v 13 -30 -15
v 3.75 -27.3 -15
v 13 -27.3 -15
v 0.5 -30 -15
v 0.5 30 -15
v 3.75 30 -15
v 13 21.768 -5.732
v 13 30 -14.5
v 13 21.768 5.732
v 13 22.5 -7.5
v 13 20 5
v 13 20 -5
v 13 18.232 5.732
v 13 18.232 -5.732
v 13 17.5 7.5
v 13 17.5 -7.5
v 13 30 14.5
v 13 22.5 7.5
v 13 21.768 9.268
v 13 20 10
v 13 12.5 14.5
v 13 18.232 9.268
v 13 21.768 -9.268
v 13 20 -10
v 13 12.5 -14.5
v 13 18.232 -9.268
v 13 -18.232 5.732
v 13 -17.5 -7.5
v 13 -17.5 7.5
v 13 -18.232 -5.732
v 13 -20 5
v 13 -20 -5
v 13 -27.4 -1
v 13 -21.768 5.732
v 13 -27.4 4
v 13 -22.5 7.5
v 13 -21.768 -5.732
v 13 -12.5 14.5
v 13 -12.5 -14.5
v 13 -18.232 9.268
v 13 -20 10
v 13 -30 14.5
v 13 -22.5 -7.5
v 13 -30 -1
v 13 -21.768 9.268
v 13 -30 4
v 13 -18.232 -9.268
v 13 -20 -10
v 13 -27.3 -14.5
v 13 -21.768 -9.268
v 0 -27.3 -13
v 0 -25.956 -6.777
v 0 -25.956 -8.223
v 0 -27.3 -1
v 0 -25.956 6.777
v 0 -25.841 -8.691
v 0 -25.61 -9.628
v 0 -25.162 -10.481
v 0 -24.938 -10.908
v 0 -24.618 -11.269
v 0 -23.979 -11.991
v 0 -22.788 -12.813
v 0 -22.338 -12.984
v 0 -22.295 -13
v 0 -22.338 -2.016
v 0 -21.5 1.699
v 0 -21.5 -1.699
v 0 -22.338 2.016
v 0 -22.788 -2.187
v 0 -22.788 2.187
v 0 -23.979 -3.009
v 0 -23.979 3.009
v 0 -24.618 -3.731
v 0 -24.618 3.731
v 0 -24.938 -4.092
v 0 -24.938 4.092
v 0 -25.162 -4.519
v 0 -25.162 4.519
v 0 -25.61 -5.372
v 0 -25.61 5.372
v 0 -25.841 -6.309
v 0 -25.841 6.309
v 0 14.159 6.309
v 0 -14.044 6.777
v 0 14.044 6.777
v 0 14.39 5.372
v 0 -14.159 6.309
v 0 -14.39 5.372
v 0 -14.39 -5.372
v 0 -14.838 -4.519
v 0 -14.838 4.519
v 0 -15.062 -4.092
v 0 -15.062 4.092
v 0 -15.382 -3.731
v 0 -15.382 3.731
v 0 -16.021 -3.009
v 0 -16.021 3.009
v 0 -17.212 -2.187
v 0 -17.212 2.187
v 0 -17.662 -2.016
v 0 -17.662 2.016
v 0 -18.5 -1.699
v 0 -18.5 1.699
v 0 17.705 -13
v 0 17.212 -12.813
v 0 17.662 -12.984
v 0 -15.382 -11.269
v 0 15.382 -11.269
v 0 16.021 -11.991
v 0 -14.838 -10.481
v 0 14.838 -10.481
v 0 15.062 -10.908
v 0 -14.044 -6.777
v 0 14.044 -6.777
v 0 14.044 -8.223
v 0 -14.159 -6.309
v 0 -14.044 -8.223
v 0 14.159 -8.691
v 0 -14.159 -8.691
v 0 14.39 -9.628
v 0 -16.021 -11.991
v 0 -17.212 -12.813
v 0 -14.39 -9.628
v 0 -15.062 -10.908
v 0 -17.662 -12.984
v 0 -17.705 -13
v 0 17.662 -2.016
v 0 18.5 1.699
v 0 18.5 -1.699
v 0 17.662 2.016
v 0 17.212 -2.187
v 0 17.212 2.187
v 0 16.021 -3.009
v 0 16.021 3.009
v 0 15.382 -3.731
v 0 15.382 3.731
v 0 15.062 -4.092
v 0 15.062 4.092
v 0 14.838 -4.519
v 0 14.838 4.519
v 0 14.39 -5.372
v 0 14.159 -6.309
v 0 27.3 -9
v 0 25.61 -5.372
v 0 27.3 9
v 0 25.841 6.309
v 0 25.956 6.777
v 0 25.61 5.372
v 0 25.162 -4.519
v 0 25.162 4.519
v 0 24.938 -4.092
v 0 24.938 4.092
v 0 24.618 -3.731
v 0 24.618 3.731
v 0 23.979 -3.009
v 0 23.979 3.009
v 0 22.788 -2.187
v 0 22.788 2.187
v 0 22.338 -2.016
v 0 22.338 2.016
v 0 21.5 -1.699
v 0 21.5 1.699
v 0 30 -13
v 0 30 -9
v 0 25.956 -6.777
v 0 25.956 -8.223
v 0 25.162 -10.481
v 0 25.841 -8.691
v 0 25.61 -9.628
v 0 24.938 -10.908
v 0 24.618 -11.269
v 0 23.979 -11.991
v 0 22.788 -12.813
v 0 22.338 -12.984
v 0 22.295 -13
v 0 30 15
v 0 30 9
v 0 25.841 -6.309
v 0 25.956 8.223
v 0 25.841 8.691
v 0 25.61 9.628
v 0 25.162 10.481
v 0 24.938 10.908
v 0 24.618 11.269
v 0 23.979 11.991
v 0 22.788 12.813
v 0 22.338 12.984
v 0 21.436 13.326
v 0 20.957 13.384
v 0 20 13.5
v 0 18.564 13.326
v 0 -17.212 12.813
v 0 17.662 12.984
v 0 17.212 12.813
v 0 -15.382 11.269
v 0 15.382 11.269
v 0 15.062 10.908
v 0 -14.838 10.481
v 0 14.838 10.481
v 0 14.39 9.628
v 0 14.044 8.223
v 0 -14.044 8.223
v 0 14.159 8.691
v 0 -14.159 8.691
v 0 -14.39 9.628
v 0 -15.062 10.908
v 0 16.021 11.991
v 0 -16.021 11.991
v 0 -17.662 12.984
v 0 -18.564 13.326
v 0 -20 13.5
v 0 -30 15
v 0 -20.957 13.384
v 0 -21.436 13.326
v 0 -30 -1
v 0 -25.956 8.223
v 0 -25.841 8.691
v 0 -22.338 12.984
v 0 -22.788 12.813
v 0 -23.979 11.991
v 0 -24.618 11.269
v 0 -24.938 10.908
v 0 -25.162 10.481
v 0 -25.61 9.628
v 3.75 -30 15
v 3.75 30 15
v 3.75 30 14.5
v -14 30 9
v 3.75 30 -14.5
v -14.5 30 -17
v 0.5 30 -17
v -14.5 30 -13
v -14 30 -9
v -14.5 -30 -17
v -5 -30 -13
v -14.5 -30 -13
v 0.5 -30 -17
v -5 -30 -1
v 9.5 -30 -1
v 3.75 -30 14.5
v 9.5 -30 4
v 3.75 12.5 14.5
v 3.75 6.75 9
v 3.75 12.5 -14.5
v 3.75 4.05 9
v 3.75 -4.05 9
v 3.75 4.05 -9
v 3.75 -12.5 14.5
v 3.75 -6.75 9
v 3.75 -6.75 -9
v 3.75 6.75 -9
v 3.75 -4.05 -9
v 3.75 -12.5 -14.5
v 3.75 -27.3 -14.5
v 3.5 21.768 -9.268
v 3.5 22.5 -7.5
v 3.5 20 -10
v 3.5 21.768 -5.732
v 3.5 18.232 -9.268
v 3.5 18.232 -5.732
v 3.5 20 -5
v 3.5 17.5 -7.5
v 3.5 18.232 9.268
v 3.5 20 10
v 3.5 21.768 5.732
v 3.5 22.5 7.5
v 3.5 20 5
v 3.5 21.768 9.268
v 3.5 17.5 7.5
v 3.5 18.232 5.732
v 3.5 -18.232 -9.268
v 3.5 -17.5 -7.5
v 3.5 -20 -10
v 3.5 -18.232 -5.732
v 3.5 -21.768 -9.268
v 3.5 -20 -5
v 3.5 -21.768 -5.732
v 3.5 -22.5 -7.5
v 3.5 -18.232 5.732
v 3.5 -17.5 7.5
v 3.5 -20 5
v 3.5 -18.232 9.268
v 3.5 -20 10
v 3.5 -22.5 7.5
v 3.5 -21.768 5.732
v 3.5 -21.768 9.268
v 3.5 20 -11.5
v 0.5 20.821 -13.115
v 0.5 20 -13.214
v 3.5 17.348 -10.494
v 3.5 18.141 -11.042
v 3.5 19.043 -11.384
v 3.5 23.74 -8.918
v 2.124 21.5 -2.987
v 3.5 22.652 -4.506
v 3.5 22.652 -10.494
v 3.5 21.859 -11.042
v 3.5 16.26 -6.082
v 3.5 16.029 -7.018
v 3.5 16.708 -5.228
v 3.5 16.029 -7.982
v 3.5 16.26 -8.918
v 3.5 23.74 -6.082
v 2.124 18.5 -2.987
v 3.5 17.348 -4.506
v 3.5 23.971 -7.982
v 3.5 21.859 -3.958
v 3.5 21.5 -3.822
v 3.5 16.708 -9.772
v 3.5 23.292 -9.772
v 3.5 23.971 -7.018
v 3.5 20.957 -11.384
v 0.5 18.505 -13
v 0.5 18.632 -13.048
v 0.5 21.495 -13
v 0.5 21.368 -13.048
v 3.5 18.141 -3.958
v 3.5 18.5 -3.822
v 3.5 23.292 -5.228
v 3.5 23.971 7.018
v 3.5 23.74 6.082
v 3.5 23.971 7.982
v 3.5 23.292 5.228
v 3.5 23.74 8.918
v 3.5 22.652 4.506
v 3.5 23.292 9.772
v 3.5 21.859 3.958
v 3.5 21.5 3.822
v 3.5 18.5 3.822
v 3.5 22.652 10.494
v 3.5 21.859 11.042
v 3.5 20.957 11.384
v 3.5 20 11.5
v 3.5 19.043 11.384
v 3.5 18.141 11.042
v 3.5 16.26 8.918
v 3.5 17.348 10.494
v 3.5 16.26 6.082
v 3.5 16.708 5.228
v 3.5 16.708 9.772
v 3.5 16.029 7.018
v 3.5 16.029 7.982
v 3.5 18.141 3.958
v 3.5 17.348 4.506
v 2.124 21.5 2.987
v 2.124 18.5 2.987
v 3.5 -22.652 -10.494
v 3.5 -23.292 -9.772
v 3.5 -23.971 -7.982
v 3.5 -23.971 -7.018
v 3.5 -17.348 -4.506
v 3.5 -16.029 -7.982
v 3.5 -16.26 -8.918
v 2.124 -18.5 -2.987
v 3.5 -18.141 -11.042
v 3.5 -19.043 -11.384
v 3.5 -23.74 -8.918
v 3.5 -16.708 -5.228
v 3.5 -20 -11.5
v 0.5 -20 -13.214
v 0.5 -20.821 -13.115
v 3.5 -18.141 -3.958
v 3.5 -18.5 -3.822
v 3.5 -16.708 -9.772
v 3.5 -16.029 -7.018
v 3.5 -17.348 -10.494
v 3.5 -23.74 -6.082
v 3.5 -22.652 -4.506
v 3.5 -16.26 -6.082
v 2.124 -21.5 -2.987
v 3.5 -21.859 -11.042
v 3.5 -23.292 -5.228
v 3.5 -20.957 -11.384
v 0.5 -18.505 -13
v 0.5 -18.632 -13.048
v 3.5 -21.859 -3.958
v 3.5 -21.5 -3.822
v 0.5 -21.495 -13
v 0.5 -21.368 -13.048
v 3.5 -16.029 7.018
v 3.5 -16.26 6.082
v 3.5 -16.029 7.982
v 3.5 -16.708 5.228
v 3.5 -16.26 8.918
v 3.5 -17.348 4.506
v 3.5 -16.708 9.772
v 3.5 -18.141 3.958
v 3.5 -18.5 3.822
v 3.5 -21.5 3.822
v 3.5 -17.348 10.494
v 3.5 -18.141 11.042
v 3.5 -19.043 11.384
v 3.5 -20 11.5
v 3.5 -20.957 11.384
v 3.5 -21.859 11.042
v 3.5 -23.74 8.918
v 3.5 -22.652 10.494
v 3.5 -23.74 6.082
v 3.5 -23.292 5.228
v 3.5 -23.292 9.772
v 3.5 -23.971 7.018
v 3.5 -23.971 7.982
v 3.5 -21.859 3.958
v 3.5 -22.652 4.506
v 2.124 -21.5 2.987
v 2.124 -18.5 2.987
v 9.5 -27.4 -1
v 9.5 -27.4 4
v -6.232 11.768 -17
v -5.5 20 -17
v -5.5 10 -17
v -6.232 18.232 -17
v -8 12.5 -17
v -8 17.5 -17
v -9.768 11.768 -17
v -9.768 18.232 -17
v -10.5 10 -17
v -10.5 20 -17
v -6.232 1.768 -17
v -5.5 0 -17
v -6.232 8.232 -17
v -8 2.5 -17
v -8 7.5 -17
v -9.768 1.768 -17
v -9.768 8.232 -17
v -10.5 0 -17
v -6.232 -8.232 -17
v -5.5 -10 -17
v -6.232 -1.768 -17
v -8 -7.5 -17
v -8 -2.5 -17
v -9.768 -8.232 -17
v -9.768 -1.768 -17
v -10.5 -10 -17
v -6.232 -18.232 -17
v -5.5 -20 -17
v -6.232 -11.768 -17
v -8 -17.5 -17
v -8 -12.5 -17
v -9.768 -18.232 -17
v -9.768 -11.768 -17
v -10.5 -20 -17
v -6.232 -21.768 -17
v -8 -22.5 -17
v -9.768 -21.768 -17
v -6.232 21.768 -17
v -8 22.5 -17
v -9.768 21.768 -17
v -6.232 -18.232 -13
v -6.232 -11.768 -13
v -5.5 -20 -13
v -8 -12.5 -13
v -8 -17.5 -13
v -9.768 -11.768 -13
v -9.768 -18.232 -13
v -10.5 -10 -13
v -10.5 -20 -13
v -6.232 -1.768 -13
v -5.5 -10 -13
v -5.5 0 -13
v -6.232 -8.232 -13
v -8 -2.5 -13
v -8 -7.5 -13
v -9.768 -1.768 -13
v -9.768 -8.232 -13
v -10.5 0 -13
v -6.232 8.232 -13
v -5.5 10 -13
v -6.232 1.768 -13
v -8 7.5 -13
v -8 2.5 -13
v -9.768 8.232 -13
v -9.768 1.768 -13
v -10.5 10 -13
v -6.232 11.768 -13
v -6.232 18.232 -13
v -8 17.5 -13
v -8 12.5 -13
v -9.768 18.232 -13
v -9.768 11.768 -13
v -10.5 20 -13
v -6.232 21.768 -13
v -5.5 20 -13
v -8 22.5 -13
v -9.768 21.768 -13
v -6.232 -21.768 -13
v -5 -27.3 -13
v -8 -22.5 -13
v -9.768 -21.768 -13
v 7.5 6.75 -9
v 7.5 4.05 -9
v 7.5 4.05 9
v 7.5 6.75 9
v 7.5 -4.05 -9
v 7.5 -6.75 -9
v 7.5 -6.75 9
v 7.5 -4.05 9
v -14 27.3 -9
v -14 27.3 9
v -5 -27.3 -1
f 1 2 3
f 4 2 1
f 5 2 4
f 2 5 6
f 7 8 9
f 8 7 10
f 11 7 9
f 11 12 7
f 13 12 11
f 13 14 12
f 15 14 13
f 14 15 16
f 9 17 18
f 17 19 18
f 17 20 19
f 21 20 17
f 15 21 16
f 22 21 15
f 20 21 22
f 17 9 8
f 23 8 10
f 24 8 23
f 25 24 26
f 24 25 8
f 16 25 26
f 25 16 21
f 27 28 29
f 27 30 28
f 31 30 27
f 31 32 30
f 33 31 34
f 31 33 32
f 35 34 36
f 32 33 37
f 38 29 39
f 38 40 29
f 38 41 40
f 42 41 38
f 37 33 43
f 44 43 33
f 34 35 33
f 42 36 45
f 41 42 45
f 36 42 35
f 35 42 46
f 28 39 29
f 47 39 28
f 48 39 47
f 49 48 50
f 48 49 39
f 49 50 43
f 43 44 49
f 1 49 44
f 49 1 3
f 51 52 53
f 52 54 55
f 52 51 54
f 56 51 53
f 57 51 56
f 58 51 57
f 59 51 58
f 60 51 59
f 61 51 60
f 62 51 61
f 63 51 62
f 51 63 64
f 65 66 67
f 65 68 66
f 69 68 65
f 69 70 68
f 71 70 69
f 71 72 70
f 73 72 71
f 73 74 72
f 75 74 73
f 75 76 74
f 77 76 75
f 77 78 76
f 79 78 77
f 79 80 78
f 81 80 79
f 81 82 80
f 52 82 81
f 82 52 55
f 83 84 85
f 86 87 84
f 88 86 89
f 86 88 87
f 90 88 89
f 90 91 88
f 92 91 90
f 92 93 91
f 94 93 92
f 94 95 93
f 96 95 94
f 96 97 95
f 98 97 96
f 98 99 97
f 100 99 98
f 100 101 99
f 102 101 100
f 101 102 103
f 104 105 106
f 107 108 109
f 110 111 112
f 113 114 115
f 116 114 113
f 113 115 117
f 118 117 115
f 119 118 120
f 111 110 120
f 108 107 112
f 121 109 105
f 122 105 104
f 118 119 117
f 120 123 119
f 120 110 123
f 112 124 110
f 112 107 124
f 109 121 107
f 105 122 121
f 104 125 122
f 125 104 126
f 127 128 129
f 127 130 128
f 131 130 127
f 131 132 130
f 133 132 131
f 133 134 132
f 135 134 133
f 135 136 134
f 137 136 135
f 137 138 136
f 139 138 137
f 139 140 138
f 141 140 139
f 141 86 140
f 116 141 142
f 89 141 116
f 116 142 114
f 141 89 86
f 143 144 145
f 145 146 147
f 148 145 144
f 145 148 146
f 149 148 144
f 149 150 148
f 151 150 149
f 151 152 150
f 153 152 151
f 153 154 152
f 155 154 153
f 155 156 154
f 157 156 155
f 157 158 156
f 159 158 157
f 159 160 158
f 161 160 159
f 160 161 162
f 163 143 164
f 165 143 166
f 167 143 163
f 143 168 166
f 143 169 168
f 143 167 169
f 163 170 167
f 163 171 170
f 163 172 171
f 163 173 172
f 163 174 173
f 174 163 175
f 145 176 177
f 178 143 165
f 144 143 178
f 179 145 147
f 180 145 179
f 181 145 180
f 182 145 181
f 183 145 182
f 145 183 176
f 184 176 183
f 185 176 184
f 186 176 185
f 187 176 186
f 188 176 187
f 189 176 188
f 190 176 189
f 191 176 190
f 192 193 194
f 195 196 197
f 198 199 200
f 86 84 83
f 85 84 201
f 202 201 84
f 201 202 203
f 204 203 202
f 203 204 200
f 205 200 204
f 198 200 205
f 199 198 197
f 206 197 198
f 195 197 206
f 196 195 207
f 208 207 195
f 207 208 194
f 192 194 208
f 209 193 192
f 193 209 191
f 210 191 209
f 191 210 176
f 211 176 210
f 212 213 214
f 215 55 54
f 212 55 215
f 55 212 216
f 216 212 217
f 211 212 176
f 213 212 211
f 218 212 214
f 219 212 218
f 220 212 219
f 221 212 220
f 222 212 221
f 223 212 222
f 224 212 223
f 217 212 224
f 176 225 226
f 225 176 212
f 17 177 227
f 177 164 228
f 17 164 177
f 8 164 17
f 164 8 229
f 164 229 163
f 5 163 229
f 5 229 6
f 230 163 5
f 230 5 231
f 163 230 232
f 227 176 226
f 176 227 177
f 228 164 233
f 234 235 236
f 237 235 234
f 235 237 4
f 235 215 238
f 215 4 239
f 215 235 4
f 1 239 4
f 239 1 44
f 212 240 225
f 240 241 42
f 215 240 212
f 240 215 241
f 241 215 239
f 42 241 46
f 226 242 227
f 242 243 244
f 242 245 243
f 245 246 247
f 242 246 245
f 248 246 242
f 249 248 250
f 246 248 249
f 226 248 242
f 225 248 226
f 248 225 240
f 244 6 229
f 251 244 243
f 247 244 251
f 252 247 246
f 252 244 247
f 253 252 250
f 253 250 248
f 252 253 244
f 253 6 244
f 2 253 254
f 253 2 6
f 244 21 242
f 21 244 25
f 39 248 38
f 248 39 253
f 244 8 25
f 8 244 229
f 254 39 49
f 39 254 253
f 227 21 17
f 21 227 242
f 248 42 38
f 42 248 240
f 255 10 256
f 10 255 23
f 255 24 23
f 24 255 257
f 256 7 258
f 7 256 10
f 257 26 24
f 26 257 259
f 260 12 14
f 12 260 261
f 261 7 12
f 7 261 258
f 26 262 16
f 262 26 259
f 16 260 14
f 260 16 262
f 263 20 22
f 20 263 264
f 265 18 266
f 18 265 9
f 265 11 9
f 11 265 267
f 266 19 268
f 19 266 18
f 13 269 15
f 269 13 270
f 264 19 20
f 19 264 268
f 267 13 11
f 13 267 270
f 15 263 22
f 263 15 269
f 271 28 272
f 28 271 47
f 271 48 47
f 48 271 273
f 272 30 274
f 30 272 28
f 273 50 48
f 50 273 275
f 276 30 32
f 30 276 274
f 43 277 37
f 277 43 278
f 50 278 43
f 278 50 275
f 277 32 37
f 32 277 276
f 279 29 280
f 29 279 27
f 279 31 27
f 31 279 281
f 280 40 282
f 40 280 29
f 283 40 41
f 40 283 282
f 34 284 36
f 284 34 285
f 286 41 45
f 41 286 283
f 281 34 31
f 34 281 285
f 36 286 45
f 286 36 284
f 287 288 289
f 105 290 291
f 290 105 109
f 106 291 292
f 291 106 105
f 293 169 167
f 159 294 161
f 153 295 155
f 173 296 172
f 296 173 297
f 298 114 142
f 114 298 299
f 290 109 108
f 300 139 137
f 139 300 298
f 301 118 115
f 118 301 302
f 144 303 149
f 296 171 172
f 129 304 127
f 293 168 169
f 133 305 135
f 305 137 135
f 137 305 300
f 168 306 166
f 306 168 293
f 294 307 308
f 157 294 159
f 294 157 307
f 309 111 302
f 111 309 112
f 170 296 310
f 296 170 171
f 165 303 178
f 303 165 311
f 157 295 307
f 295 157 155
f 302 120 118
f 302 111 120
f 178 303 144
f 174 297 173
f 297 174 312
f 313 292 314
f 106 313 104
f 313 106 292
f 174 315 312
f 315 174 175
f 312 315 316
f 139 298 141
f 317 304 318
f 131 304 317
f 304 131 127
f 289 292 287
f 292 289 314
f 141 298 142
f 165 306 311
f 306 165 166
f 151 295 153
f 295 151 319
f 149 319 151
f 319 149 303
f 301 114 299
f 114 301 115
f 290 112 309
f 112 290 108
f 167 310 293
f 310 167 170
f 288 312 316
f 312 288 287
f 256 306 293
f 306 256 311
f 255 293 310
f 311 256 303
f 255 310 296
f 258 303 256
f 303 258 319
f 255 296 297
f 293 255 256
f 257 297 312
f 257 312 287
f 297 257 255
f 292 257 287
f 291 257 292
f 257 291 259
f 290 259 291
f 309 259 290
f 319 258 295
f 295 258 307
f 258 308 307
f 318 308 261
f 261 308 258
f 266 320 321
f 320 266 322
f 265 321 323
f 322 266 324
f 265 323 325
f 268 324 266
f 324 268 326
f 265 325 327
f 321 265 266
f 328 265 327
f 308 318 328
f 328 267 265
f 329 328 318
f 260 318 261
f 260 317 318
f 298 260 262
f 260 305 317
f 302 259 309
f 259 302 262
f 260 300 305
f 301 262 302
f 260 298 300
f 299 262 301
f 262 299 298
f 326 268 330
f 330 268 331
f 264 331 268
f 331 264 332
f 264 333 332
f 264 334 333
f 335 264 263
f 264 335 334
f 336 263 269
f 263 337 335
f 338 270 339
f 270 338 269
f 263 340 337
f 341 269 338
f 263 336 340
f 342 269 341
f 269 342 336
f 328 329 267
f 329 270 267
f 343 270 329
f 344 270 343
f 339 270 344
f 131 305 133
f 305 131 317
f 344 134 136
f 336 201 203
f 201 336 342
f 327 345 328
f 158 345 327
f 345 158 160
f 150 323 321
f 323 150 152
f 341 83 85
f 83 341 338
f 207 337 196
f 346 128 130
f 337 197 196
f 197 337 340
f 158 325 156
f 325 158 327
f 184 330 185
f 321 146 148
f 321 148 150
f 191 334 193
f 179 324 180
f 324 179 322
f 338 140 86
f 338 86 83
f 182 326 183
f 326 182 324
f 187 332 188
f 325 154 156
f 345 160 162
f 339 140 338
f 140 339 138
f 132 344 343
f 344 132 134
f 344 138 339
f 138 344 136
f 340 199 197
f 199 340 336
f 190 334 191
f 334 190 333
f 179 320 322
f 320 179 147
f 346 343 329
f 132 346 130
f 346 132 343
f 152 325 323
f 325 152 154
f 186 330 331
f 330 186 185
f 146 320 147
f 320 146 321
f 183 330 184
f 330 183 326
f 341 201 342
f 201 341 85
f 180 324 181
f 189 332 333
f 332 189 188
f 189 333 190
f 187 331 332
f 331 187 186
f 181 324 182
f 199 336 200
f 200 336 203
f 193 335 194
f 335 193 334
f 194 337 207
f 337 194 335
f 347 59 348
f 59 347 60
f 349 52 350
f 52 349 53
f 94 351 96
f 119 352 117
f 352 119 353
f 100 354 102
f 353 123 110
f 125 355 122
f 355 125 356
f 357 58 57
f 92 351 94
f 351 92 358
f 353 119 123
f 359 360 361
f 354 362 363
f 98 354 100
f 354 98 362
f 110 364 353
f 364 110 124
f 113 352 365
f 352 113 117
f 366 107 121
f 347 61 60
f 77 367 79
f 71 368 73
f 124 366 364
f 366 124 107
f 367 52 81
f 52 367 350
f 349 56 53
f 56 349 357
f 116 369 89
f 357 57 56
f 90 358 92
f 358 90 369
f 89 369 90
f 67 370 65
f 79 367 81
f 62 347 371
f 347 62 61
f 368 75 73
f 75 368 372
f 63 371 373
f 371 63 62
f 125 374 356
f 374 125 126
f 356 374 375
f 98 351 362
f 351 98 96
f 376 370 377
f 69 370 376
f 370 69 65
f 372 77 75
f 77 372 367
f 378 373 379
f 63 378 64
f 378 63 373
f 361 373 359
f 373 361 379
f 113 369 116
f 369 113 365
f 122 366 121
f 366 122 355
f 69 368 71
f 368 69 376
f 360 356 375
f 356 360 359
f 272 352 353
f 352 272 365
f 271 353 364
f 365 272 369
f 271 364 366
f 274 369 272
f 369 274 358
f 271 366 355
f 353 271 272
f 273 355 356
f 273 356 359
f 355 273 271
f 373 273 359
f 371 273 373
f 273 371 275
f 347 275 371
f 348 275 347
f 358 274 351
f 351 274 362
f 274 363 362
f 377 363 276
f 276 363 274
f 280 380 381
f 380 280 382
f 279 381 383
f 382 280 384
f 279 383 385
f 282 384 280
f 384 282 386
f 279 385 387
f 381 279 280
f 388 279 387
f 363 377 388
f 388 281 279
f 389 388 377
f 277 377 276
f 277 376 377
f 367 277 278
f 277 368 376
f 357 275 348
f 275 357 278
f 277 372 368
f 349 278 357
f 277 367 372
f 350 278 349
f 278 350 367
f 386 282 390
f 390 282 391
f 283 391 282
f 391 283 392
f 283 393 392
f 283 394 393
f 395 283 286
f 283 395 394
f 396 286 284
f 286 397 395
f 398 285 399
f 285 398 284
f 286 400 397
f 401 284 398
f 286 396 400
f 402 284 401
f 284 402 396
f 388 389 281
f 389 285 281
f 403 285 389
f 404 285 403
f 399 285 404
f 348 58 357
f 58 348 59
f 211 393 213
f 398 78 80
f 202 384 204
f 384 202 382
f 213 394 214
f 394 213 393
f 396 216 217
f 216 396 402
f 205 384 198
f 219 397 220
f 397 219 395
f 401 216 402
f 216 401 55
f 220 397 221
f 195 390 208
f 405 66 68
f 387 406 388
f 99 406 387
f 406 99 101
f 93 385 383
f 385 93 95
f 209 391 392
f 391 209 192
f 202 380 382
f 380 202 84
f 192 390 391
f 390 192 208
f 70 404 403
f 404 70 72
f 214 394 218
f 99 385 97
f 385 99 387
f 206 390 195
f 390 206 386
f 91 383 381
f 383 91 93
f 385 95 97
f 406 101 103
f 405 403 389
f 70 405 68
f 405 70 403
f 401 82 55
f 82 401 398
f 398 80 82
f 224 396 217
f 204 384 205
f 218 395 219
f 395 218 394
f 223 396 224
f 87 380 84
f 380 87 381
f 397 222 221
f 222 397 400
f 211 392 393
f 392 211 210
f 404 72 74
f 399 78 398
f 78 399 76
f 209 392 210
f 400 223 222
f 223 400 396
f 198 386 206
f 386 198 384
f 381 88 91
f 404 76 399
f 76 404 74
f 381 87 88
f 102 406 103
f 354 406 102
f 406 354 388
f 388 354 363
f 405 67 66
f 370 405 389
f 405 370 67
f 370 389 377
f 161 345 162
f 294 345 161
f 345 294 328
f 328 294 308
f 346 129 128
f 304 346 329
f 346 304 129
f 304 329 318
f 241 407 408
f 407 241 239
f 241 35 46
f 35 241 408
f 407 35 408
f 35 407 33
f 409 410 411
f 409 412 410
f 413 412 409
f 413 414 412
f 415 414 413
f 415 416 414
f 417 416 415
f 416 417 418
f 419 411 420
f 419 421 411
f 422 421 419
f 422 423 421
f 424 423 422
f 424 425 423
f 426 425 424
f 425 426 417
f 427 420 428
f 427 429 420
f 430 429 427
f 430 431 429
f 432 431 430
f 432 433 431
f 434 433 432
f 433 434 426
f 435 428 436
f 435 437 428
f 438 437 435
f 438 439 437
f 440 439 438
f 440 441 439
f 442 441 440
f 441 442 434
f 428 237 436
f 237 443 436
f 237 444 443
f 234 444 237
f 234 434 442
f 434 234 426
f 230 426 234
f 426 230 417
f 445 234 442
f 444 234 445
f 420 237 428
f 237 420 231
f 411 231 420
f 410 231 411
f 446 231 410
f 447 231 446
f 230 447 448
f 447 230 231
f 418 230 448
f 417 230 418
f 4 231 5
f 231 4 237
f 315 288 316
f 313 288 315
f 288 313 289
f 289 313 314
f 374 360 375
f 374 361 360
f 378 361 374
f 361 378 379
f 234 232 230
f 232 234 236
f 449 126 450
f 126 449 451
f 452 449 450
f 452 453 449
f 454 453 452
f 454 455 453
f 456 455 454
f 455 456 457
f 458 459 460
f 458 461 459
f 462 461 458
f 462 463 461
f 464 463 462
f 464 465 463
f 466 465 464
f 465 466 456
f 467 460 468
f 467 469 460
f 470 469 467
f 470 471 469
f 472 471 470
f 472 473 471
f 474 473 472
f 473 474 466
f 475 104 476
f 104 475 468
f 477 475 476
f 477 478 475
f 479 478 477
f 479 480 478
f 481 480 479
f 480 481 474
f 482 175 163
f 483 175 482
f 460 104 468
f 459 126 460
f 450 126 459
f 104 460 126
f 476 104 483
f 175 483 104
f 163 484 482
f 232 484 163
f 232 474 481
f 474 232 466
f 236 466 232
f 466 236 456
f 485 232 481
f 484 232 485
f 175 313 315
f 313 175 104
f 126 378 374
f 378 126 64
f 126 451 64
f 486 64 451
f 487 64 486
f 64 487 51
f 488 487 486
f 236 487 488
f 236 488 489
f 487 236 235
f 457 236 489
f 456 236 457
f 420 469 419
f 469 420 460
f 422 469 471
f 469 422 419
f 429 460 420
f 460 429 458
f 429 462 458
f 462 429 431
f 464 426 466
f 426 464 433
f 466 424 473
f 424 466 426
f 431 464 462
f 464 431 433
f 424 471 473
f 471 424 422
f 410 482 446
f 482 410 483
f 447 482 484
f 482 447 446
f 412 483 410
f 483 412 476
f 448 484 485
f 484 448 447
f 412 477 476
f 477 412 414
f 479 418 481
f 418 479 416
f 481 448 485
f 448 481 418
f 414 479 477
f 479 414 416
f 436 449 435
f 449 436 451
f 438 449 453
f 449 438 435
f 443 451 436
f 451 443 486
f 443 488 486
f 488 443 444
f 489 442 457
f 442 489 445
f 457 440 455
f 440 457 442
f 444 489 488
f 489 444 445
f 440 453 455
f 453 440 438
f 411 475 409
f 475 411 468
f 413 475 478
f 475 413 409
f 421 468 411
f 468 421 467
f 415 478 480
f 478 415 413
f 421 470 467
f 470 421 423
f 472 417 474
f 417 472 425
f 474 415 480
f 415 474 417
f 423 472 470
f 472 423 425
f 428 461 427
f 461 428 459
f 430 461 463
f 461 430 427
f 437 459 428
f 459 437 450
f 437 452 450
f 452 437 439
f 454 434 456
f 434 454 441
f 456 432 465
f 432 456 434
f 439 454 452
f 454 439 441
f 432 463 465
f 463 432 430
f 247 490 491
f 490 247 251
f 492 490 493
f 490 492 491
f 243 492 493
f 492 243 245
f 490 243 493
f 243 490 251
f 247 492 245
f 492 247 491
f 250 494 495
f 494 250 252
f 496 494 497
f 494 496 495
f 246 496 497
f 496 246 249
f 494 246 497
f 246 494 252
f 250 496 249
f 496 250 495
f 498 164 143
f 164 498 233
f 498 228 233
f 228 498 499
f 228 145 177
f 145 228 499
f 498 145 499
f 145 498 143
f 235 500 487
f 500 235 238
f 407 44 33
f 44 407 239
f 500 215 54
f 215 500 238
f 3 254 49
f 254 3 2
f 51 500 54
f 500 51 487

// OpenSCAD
//block shape
x=30;
y=60;
z=13;

// track channel
f=x+10;
g=25;
h=9.5;
// block top
e=20;
r=y+10;
t=16.5;

// spacing of screw holes
cx=15;
cy=40;
dx=15;
dy=45;

// rotation
gx=90;

rotate([0,gx,0])
difference()
{
    translate([0,0,z]/2) cube ([x,y,z],center=true);
    translate([0,0,z+4]/2) cube([f,g,h],center=true);
    translate([49,0,z+11]/2) cube ([e,r,t],center=true);
        translate([-49,0,z+11]/2) cube ([e,r,t],center=true);

  translate([cx,cy,0]/2) cylinder(d=5, h=50,  center=true);
  translate([-cx,cy,0]/2) cylinder(d=5, h=50,  center=true);
    translate([cx,-cy,0]/2) cylinder(d=5, h=50,  center=true);
    translate([-cx,-cy,0]/2) cylinder(d=5, h=50,  center=true);
  translate([dy,dy,0]/2) cylinder(d=5, h=50,  center=true);
  translate([-dy,dy,0]/2) cylinder(d=5, h=50,  center=true);
    translate([dy,-dy,0]/2) cylinder(d=5, h=50,  center=true);
    translate([-dy,-dy,0]/2) cylinder(d=5, h=50,  center=true);  
    translate([dy,dx,0]/2) cylinder(d=5, h=50,  center=true);
  translate([-dy,dx,0]/2) cylinder(d=5, h=50,  center=true);  
  translate([dy,-dx,0]/2) cylinder(d=5, h=50,  center=true);
  translate([-dy,-dx,0]/2) cylinder(d=5, h=50,  center=true);  
    
 translate([cx,cy,0]/2)  cylinder(d1=16, d2=8, h=7,  center=true);
 translate([-cx,cy,0]/2) cylinder(d1=16, d2=8, h=7, center=true);
    translate([cx,-cy,0]/2) cylinder(d1=16, d2=8, h=7,  center=true);
    translate([-cx,-cy,0]/2) cylinder(d1=16, d2=8, h=7,  center=true);    
// zip tie knotches    
    translate([0,-cy/2,11.5-10]) cube([18,3,4],center=true);
    translate([0,cy/2,11.5-10]) cube([18,3,4],center=true);
// removal knotches
       translate([0,-(6.8+51)/2,11.5]) cube([8,3,4],center=true);
   translate([0,(6.8+51)/2,11.5-10]) cube([8,3,4],center=true);
   translate([(6.8+51)/2,0,11.5-11]) cube([3,8,2],center=true);
   translate([-(6.8+51)/2,0,11.5-11]) cube([3,8,2],center=true);
}

rotate([0,gx,0])
difference ()
{
    translate([15,0,-7]) cube([4,60,15],center=true);
    translate([0,0,-8])rotate([90,0,90]) cylinder(d=5, h=60, center=true);
      translate([-9,20,-8])rotate([90,0,90]) cylinder(d=5, h=60, center=true);
      translate([8,-20,-8])rotate([90,0,90]) cylinder(d=5, h=60, center=true);
        translate([-9,10,-8])rotate([90,0,90]) cylinder(d=5, h=60, center=true);
      translate([8,-10,-8])rotate([90,0,90]) cylinder(d=5, h=60, center=true);

}
rotate([0,gx,0])
translate([0,(6.8+4)/2,z-8]) cube([18,2.7,5],center=true);
rotate([0,gx,0])
translate([0,-(6.8+4)/2,z-8]) cube([18,2.7,5],center=true);

rotate([0,gx,0])
translate([0,57.3/2,-5]) cube([18,2.7,18],center=true);
rotate([0,gx,0])
translate([8,-57.3/2,4]) cube([14,2.7,18],center=true);
